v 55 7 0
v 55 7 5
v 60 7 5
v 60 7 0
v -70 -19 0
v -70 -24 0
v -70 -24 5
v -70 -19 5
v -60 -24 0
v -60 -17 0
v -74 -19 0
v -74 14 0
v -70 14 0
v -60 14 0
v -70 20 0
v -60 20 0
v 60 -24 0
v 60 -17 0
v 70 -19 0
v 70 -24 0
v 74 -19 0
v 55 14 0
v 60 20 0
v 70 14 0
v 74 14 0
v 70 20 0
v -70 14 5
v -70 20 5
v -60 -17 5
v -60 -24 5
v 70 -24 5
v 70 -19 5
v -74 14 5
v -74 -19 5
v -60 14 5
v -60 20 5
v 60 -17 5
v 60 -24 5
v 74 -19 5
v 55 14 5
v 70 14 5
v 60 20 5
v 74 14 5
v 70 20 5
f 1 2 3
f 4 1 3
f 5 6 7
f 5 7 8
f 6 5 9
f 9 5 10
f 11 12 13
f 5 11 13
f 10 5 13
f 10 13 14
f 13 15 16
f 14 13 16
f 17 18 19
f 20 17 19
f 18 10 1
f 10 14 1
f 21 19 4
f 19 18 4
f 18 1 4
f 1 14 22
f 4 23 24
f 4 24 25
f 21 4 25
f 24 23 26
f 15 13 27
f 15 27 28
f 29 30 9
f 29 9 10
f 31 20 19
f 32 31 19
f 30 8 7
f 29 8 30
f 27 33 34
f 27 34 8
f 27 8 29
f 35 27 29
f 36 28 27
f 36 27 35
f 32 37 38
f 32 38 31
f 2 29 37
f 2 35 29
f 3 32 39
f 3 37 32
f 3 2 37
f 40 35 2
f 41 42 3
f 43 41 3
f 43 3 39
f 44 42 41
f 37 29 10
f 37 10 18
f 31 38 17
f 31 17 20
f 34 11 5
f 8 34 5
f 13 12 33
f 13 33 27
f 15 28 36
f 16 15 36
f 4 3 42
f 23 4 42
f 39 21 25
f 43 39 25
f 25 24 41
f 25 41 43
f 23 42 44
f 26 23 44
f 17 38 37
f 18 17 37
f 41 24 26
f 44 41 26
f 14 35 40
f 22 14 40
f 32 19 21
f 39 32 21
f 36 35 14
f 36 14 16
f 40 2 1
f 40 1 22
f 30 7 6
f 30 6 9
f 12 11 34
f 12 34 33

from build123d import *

# Parameters (mm, degrees)
F0_W      = 140
F0_H      = 30
F1_DEPTH  = 5
F2_W      = 10
F2_H      = 5
F3_DEPTH  = 5
F2_H_2    = 9
F5_W      = 5
F5_H      = 8
F6_DEPTH  = 25
F7_W      = 120
F7_H      = 2
F8_DEPTH  = 5
F9_W      = 115
F9_H      = 1
F10_DEPTH = 25
F11_W     = 4
F11_H     = 33
F12_DEPTH = 5


# Not quite as in the source:
# - a feature names something its author has since deleted; it is built from what else it names


with BuildPart() as f1:
    # F0 (on Top) → F1 (new body)
    with BuildSketch(Plane.XY):
        Rectangle(F0_W, F0_H)
    extrude(amount=F1_DEPTH)


with BuildPart() as f3:
    # F2 (on face) → F3 (new body)
    with BuildSketch(Plane.XY.offset(5)):
        with Locations((65, 17.5)):
            Rectangle(F2_W, F2_H)
    extrude(amount=-F3_DEPTH)


with BuildPart() as f3b:
    # F2 (on face) → F3, piece 2 (new body)
    with BuildSketch(Plane.XY.offset(5)):
        with Locations((-65, 17.5)):
            Rectangle(F2_W, F2_H)
    extrude(amount=-F3_DEPTH)


with BuildPart() as f3c:
    # F2 (on face) → F3, piece 3 (new body)
    with BuildSketch(Plane.XY.offset(5)):
        with Locations((-65, -19.5)):
            Rectangle(F2_W, F2_H_2)
    extrude(amount=-F3_DEPTH)


with BuildPart() as f3d:
    # F2 (on face) → F3, piece 4 (new body)
    with BuildSketch(Plane.XY.offset(5)):
        with Locations((65, -19.5)):
            Rectangle(F2_W, F2_H_2)
    extrude(amount=-F3_DEPTH)


with BuildPart() as f3b_1:
    add(f3b.part)

    # F4: union F3, F3c, F3d, F1
    add(f3.part)
    add(f3c.part)
    add(f3d.part)
    add(f1.part)

    # F5 (on face) → F6 (cut)
    with BuildSketch(Plane.XY.offset(5)):
        with Locations((57.5, 11)):
            Rectangle(F5_W, F5_H)
    extrude(amount=-F6_DEPTH, mode=Mode.SUBTRACT)

    # F7 (on face) → F8 (join)
    with BuildSketch(Plane.XY.offset(5)):
        with Locations((0, -16)):
            Rectangle(F7_W, F7_H)
    extrude(amount=-F8_DEPTH)

    # F9 (on face) → F10 (cut)
    with BuildSketch(Plane.XY.offset(5)):
        with Locations((-2.5, 14.5)):
            Rectangle(F9_W, F9_H)
    extrude(amount=-F10_DEPTH, mode=Mode.SUBTRACT)

    # F11 (on Top) → F12 (join)
    with BuildSketch(Plane.XY):
        with Locations((-72, -2.5)):
            Rectangle(F11_W, F11_H)
        with Locations((72, -2.5)):
            Rectangle(F11_W, F11_H)
    extrude(amount=F12_DEPTH)


solid = f3b_1.part
